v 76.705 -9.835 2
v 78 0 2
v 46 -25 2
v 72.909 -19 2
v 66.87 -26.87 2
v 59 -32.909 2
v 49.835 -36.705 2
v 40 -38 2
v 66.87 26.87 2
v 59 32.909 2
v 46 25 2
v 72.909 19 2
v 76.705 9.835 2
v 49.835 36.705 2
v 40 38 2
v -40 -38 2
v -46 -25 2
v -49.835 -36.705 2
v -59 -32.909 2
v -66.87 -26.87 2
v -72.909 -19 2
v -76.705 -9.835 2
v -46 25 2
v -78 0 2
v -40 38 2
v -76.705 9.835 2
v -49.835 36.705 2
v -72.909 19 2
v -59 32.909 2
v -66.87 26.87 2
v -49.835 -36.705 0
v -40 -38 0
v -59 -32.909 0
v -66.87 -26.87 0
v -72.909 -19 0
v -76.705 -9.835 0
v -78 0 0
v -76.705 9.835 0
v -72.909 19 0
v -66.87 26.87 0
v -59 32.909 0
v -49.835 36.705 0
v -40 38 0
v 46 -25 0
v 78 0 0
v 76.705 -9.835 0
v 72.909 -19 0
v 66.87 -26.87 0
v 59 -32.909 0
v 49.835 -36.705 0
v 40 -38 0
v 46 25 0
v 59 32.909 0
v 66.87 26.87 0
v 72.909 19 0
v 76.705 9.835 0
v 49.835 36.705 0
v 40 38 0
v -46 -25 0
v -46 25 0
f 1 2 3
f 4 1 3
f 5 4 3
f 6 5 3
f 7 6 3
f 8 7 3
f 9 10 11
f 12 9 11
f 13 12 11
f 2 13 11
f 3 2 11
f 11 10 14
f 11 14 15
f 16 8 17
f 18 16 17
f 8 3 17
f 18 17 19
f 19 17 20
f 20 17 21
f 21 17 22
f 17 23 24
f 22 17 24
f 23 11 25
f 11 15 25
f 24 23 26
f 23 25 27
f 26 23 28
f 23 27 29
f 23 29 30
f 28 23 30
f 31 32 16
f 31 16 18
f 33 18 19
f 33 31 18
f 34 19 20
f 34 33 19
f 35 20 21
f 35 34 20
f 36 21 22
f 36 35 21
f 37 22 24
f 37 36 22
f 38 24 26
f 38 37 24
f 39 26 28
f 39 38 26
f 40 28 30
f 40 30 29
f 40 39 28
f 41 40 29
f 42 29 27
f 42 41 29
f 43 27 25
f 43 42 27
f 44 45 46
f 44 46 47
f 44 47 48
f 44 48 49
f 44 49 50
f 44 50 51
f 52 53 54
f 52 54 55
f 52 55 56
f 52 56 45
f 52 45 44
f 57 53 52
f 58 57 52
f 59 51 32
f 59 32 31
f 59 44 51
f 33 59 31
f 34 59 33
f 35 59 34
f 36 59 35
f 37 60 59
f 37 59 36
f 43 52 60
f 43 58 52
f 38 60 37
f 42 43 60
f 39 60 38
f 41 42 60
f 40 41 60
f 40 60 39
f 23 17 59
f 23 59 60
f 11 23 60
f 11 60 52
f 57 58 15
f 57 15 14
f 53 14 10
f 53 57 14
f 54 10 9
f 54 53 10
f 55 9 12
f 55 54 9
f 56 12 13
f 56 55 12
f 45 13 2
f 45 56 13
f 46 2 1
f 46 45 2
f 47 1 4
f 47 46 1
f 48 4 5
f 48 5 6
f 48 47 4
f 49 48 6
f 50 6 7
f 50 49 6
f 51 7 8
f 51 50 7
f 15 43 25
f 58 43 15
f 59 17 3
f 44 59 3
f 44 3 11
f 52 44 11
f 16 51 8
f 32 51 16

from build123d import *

# Parameters (mm, degrees)
EXTRUDE_1_DEPTH     = 2
SKETCH_2_W          = 92
SKETCH_2_H          = 50
CUT_EXTRUDE_1_DEPTH = 87.787095815


with BuildPart() as part:
    # Эскиз1 → Бобышка-Вытянуть1 (new body)
    with BuildSketch(Plane.XY):
        with BuildLine():
            Line((-40, 38), (40, 38))
            ThreePointArc((40, 38), (78, 0), (40, -38))
            Line((40, -38), (-40, -38))
            ThreePointArc((-40, -38), (-78, 0), (-40, 38))
        make_face()
    extrude(amount=EXTRUDE_1_DEPTH)

    # Эскиз2 → Вырез-Вытянуть1 (cut, through all)
    with BuildSketch(Plane.XY.offset(2)):
        Rectangle(SKETCH_2_W, SKETCH_2_H)
    extrude(amount=-CUT_EXTRUDE_1_DEPTH, mode=Mode.SUBTRACT)


solid = part.part
